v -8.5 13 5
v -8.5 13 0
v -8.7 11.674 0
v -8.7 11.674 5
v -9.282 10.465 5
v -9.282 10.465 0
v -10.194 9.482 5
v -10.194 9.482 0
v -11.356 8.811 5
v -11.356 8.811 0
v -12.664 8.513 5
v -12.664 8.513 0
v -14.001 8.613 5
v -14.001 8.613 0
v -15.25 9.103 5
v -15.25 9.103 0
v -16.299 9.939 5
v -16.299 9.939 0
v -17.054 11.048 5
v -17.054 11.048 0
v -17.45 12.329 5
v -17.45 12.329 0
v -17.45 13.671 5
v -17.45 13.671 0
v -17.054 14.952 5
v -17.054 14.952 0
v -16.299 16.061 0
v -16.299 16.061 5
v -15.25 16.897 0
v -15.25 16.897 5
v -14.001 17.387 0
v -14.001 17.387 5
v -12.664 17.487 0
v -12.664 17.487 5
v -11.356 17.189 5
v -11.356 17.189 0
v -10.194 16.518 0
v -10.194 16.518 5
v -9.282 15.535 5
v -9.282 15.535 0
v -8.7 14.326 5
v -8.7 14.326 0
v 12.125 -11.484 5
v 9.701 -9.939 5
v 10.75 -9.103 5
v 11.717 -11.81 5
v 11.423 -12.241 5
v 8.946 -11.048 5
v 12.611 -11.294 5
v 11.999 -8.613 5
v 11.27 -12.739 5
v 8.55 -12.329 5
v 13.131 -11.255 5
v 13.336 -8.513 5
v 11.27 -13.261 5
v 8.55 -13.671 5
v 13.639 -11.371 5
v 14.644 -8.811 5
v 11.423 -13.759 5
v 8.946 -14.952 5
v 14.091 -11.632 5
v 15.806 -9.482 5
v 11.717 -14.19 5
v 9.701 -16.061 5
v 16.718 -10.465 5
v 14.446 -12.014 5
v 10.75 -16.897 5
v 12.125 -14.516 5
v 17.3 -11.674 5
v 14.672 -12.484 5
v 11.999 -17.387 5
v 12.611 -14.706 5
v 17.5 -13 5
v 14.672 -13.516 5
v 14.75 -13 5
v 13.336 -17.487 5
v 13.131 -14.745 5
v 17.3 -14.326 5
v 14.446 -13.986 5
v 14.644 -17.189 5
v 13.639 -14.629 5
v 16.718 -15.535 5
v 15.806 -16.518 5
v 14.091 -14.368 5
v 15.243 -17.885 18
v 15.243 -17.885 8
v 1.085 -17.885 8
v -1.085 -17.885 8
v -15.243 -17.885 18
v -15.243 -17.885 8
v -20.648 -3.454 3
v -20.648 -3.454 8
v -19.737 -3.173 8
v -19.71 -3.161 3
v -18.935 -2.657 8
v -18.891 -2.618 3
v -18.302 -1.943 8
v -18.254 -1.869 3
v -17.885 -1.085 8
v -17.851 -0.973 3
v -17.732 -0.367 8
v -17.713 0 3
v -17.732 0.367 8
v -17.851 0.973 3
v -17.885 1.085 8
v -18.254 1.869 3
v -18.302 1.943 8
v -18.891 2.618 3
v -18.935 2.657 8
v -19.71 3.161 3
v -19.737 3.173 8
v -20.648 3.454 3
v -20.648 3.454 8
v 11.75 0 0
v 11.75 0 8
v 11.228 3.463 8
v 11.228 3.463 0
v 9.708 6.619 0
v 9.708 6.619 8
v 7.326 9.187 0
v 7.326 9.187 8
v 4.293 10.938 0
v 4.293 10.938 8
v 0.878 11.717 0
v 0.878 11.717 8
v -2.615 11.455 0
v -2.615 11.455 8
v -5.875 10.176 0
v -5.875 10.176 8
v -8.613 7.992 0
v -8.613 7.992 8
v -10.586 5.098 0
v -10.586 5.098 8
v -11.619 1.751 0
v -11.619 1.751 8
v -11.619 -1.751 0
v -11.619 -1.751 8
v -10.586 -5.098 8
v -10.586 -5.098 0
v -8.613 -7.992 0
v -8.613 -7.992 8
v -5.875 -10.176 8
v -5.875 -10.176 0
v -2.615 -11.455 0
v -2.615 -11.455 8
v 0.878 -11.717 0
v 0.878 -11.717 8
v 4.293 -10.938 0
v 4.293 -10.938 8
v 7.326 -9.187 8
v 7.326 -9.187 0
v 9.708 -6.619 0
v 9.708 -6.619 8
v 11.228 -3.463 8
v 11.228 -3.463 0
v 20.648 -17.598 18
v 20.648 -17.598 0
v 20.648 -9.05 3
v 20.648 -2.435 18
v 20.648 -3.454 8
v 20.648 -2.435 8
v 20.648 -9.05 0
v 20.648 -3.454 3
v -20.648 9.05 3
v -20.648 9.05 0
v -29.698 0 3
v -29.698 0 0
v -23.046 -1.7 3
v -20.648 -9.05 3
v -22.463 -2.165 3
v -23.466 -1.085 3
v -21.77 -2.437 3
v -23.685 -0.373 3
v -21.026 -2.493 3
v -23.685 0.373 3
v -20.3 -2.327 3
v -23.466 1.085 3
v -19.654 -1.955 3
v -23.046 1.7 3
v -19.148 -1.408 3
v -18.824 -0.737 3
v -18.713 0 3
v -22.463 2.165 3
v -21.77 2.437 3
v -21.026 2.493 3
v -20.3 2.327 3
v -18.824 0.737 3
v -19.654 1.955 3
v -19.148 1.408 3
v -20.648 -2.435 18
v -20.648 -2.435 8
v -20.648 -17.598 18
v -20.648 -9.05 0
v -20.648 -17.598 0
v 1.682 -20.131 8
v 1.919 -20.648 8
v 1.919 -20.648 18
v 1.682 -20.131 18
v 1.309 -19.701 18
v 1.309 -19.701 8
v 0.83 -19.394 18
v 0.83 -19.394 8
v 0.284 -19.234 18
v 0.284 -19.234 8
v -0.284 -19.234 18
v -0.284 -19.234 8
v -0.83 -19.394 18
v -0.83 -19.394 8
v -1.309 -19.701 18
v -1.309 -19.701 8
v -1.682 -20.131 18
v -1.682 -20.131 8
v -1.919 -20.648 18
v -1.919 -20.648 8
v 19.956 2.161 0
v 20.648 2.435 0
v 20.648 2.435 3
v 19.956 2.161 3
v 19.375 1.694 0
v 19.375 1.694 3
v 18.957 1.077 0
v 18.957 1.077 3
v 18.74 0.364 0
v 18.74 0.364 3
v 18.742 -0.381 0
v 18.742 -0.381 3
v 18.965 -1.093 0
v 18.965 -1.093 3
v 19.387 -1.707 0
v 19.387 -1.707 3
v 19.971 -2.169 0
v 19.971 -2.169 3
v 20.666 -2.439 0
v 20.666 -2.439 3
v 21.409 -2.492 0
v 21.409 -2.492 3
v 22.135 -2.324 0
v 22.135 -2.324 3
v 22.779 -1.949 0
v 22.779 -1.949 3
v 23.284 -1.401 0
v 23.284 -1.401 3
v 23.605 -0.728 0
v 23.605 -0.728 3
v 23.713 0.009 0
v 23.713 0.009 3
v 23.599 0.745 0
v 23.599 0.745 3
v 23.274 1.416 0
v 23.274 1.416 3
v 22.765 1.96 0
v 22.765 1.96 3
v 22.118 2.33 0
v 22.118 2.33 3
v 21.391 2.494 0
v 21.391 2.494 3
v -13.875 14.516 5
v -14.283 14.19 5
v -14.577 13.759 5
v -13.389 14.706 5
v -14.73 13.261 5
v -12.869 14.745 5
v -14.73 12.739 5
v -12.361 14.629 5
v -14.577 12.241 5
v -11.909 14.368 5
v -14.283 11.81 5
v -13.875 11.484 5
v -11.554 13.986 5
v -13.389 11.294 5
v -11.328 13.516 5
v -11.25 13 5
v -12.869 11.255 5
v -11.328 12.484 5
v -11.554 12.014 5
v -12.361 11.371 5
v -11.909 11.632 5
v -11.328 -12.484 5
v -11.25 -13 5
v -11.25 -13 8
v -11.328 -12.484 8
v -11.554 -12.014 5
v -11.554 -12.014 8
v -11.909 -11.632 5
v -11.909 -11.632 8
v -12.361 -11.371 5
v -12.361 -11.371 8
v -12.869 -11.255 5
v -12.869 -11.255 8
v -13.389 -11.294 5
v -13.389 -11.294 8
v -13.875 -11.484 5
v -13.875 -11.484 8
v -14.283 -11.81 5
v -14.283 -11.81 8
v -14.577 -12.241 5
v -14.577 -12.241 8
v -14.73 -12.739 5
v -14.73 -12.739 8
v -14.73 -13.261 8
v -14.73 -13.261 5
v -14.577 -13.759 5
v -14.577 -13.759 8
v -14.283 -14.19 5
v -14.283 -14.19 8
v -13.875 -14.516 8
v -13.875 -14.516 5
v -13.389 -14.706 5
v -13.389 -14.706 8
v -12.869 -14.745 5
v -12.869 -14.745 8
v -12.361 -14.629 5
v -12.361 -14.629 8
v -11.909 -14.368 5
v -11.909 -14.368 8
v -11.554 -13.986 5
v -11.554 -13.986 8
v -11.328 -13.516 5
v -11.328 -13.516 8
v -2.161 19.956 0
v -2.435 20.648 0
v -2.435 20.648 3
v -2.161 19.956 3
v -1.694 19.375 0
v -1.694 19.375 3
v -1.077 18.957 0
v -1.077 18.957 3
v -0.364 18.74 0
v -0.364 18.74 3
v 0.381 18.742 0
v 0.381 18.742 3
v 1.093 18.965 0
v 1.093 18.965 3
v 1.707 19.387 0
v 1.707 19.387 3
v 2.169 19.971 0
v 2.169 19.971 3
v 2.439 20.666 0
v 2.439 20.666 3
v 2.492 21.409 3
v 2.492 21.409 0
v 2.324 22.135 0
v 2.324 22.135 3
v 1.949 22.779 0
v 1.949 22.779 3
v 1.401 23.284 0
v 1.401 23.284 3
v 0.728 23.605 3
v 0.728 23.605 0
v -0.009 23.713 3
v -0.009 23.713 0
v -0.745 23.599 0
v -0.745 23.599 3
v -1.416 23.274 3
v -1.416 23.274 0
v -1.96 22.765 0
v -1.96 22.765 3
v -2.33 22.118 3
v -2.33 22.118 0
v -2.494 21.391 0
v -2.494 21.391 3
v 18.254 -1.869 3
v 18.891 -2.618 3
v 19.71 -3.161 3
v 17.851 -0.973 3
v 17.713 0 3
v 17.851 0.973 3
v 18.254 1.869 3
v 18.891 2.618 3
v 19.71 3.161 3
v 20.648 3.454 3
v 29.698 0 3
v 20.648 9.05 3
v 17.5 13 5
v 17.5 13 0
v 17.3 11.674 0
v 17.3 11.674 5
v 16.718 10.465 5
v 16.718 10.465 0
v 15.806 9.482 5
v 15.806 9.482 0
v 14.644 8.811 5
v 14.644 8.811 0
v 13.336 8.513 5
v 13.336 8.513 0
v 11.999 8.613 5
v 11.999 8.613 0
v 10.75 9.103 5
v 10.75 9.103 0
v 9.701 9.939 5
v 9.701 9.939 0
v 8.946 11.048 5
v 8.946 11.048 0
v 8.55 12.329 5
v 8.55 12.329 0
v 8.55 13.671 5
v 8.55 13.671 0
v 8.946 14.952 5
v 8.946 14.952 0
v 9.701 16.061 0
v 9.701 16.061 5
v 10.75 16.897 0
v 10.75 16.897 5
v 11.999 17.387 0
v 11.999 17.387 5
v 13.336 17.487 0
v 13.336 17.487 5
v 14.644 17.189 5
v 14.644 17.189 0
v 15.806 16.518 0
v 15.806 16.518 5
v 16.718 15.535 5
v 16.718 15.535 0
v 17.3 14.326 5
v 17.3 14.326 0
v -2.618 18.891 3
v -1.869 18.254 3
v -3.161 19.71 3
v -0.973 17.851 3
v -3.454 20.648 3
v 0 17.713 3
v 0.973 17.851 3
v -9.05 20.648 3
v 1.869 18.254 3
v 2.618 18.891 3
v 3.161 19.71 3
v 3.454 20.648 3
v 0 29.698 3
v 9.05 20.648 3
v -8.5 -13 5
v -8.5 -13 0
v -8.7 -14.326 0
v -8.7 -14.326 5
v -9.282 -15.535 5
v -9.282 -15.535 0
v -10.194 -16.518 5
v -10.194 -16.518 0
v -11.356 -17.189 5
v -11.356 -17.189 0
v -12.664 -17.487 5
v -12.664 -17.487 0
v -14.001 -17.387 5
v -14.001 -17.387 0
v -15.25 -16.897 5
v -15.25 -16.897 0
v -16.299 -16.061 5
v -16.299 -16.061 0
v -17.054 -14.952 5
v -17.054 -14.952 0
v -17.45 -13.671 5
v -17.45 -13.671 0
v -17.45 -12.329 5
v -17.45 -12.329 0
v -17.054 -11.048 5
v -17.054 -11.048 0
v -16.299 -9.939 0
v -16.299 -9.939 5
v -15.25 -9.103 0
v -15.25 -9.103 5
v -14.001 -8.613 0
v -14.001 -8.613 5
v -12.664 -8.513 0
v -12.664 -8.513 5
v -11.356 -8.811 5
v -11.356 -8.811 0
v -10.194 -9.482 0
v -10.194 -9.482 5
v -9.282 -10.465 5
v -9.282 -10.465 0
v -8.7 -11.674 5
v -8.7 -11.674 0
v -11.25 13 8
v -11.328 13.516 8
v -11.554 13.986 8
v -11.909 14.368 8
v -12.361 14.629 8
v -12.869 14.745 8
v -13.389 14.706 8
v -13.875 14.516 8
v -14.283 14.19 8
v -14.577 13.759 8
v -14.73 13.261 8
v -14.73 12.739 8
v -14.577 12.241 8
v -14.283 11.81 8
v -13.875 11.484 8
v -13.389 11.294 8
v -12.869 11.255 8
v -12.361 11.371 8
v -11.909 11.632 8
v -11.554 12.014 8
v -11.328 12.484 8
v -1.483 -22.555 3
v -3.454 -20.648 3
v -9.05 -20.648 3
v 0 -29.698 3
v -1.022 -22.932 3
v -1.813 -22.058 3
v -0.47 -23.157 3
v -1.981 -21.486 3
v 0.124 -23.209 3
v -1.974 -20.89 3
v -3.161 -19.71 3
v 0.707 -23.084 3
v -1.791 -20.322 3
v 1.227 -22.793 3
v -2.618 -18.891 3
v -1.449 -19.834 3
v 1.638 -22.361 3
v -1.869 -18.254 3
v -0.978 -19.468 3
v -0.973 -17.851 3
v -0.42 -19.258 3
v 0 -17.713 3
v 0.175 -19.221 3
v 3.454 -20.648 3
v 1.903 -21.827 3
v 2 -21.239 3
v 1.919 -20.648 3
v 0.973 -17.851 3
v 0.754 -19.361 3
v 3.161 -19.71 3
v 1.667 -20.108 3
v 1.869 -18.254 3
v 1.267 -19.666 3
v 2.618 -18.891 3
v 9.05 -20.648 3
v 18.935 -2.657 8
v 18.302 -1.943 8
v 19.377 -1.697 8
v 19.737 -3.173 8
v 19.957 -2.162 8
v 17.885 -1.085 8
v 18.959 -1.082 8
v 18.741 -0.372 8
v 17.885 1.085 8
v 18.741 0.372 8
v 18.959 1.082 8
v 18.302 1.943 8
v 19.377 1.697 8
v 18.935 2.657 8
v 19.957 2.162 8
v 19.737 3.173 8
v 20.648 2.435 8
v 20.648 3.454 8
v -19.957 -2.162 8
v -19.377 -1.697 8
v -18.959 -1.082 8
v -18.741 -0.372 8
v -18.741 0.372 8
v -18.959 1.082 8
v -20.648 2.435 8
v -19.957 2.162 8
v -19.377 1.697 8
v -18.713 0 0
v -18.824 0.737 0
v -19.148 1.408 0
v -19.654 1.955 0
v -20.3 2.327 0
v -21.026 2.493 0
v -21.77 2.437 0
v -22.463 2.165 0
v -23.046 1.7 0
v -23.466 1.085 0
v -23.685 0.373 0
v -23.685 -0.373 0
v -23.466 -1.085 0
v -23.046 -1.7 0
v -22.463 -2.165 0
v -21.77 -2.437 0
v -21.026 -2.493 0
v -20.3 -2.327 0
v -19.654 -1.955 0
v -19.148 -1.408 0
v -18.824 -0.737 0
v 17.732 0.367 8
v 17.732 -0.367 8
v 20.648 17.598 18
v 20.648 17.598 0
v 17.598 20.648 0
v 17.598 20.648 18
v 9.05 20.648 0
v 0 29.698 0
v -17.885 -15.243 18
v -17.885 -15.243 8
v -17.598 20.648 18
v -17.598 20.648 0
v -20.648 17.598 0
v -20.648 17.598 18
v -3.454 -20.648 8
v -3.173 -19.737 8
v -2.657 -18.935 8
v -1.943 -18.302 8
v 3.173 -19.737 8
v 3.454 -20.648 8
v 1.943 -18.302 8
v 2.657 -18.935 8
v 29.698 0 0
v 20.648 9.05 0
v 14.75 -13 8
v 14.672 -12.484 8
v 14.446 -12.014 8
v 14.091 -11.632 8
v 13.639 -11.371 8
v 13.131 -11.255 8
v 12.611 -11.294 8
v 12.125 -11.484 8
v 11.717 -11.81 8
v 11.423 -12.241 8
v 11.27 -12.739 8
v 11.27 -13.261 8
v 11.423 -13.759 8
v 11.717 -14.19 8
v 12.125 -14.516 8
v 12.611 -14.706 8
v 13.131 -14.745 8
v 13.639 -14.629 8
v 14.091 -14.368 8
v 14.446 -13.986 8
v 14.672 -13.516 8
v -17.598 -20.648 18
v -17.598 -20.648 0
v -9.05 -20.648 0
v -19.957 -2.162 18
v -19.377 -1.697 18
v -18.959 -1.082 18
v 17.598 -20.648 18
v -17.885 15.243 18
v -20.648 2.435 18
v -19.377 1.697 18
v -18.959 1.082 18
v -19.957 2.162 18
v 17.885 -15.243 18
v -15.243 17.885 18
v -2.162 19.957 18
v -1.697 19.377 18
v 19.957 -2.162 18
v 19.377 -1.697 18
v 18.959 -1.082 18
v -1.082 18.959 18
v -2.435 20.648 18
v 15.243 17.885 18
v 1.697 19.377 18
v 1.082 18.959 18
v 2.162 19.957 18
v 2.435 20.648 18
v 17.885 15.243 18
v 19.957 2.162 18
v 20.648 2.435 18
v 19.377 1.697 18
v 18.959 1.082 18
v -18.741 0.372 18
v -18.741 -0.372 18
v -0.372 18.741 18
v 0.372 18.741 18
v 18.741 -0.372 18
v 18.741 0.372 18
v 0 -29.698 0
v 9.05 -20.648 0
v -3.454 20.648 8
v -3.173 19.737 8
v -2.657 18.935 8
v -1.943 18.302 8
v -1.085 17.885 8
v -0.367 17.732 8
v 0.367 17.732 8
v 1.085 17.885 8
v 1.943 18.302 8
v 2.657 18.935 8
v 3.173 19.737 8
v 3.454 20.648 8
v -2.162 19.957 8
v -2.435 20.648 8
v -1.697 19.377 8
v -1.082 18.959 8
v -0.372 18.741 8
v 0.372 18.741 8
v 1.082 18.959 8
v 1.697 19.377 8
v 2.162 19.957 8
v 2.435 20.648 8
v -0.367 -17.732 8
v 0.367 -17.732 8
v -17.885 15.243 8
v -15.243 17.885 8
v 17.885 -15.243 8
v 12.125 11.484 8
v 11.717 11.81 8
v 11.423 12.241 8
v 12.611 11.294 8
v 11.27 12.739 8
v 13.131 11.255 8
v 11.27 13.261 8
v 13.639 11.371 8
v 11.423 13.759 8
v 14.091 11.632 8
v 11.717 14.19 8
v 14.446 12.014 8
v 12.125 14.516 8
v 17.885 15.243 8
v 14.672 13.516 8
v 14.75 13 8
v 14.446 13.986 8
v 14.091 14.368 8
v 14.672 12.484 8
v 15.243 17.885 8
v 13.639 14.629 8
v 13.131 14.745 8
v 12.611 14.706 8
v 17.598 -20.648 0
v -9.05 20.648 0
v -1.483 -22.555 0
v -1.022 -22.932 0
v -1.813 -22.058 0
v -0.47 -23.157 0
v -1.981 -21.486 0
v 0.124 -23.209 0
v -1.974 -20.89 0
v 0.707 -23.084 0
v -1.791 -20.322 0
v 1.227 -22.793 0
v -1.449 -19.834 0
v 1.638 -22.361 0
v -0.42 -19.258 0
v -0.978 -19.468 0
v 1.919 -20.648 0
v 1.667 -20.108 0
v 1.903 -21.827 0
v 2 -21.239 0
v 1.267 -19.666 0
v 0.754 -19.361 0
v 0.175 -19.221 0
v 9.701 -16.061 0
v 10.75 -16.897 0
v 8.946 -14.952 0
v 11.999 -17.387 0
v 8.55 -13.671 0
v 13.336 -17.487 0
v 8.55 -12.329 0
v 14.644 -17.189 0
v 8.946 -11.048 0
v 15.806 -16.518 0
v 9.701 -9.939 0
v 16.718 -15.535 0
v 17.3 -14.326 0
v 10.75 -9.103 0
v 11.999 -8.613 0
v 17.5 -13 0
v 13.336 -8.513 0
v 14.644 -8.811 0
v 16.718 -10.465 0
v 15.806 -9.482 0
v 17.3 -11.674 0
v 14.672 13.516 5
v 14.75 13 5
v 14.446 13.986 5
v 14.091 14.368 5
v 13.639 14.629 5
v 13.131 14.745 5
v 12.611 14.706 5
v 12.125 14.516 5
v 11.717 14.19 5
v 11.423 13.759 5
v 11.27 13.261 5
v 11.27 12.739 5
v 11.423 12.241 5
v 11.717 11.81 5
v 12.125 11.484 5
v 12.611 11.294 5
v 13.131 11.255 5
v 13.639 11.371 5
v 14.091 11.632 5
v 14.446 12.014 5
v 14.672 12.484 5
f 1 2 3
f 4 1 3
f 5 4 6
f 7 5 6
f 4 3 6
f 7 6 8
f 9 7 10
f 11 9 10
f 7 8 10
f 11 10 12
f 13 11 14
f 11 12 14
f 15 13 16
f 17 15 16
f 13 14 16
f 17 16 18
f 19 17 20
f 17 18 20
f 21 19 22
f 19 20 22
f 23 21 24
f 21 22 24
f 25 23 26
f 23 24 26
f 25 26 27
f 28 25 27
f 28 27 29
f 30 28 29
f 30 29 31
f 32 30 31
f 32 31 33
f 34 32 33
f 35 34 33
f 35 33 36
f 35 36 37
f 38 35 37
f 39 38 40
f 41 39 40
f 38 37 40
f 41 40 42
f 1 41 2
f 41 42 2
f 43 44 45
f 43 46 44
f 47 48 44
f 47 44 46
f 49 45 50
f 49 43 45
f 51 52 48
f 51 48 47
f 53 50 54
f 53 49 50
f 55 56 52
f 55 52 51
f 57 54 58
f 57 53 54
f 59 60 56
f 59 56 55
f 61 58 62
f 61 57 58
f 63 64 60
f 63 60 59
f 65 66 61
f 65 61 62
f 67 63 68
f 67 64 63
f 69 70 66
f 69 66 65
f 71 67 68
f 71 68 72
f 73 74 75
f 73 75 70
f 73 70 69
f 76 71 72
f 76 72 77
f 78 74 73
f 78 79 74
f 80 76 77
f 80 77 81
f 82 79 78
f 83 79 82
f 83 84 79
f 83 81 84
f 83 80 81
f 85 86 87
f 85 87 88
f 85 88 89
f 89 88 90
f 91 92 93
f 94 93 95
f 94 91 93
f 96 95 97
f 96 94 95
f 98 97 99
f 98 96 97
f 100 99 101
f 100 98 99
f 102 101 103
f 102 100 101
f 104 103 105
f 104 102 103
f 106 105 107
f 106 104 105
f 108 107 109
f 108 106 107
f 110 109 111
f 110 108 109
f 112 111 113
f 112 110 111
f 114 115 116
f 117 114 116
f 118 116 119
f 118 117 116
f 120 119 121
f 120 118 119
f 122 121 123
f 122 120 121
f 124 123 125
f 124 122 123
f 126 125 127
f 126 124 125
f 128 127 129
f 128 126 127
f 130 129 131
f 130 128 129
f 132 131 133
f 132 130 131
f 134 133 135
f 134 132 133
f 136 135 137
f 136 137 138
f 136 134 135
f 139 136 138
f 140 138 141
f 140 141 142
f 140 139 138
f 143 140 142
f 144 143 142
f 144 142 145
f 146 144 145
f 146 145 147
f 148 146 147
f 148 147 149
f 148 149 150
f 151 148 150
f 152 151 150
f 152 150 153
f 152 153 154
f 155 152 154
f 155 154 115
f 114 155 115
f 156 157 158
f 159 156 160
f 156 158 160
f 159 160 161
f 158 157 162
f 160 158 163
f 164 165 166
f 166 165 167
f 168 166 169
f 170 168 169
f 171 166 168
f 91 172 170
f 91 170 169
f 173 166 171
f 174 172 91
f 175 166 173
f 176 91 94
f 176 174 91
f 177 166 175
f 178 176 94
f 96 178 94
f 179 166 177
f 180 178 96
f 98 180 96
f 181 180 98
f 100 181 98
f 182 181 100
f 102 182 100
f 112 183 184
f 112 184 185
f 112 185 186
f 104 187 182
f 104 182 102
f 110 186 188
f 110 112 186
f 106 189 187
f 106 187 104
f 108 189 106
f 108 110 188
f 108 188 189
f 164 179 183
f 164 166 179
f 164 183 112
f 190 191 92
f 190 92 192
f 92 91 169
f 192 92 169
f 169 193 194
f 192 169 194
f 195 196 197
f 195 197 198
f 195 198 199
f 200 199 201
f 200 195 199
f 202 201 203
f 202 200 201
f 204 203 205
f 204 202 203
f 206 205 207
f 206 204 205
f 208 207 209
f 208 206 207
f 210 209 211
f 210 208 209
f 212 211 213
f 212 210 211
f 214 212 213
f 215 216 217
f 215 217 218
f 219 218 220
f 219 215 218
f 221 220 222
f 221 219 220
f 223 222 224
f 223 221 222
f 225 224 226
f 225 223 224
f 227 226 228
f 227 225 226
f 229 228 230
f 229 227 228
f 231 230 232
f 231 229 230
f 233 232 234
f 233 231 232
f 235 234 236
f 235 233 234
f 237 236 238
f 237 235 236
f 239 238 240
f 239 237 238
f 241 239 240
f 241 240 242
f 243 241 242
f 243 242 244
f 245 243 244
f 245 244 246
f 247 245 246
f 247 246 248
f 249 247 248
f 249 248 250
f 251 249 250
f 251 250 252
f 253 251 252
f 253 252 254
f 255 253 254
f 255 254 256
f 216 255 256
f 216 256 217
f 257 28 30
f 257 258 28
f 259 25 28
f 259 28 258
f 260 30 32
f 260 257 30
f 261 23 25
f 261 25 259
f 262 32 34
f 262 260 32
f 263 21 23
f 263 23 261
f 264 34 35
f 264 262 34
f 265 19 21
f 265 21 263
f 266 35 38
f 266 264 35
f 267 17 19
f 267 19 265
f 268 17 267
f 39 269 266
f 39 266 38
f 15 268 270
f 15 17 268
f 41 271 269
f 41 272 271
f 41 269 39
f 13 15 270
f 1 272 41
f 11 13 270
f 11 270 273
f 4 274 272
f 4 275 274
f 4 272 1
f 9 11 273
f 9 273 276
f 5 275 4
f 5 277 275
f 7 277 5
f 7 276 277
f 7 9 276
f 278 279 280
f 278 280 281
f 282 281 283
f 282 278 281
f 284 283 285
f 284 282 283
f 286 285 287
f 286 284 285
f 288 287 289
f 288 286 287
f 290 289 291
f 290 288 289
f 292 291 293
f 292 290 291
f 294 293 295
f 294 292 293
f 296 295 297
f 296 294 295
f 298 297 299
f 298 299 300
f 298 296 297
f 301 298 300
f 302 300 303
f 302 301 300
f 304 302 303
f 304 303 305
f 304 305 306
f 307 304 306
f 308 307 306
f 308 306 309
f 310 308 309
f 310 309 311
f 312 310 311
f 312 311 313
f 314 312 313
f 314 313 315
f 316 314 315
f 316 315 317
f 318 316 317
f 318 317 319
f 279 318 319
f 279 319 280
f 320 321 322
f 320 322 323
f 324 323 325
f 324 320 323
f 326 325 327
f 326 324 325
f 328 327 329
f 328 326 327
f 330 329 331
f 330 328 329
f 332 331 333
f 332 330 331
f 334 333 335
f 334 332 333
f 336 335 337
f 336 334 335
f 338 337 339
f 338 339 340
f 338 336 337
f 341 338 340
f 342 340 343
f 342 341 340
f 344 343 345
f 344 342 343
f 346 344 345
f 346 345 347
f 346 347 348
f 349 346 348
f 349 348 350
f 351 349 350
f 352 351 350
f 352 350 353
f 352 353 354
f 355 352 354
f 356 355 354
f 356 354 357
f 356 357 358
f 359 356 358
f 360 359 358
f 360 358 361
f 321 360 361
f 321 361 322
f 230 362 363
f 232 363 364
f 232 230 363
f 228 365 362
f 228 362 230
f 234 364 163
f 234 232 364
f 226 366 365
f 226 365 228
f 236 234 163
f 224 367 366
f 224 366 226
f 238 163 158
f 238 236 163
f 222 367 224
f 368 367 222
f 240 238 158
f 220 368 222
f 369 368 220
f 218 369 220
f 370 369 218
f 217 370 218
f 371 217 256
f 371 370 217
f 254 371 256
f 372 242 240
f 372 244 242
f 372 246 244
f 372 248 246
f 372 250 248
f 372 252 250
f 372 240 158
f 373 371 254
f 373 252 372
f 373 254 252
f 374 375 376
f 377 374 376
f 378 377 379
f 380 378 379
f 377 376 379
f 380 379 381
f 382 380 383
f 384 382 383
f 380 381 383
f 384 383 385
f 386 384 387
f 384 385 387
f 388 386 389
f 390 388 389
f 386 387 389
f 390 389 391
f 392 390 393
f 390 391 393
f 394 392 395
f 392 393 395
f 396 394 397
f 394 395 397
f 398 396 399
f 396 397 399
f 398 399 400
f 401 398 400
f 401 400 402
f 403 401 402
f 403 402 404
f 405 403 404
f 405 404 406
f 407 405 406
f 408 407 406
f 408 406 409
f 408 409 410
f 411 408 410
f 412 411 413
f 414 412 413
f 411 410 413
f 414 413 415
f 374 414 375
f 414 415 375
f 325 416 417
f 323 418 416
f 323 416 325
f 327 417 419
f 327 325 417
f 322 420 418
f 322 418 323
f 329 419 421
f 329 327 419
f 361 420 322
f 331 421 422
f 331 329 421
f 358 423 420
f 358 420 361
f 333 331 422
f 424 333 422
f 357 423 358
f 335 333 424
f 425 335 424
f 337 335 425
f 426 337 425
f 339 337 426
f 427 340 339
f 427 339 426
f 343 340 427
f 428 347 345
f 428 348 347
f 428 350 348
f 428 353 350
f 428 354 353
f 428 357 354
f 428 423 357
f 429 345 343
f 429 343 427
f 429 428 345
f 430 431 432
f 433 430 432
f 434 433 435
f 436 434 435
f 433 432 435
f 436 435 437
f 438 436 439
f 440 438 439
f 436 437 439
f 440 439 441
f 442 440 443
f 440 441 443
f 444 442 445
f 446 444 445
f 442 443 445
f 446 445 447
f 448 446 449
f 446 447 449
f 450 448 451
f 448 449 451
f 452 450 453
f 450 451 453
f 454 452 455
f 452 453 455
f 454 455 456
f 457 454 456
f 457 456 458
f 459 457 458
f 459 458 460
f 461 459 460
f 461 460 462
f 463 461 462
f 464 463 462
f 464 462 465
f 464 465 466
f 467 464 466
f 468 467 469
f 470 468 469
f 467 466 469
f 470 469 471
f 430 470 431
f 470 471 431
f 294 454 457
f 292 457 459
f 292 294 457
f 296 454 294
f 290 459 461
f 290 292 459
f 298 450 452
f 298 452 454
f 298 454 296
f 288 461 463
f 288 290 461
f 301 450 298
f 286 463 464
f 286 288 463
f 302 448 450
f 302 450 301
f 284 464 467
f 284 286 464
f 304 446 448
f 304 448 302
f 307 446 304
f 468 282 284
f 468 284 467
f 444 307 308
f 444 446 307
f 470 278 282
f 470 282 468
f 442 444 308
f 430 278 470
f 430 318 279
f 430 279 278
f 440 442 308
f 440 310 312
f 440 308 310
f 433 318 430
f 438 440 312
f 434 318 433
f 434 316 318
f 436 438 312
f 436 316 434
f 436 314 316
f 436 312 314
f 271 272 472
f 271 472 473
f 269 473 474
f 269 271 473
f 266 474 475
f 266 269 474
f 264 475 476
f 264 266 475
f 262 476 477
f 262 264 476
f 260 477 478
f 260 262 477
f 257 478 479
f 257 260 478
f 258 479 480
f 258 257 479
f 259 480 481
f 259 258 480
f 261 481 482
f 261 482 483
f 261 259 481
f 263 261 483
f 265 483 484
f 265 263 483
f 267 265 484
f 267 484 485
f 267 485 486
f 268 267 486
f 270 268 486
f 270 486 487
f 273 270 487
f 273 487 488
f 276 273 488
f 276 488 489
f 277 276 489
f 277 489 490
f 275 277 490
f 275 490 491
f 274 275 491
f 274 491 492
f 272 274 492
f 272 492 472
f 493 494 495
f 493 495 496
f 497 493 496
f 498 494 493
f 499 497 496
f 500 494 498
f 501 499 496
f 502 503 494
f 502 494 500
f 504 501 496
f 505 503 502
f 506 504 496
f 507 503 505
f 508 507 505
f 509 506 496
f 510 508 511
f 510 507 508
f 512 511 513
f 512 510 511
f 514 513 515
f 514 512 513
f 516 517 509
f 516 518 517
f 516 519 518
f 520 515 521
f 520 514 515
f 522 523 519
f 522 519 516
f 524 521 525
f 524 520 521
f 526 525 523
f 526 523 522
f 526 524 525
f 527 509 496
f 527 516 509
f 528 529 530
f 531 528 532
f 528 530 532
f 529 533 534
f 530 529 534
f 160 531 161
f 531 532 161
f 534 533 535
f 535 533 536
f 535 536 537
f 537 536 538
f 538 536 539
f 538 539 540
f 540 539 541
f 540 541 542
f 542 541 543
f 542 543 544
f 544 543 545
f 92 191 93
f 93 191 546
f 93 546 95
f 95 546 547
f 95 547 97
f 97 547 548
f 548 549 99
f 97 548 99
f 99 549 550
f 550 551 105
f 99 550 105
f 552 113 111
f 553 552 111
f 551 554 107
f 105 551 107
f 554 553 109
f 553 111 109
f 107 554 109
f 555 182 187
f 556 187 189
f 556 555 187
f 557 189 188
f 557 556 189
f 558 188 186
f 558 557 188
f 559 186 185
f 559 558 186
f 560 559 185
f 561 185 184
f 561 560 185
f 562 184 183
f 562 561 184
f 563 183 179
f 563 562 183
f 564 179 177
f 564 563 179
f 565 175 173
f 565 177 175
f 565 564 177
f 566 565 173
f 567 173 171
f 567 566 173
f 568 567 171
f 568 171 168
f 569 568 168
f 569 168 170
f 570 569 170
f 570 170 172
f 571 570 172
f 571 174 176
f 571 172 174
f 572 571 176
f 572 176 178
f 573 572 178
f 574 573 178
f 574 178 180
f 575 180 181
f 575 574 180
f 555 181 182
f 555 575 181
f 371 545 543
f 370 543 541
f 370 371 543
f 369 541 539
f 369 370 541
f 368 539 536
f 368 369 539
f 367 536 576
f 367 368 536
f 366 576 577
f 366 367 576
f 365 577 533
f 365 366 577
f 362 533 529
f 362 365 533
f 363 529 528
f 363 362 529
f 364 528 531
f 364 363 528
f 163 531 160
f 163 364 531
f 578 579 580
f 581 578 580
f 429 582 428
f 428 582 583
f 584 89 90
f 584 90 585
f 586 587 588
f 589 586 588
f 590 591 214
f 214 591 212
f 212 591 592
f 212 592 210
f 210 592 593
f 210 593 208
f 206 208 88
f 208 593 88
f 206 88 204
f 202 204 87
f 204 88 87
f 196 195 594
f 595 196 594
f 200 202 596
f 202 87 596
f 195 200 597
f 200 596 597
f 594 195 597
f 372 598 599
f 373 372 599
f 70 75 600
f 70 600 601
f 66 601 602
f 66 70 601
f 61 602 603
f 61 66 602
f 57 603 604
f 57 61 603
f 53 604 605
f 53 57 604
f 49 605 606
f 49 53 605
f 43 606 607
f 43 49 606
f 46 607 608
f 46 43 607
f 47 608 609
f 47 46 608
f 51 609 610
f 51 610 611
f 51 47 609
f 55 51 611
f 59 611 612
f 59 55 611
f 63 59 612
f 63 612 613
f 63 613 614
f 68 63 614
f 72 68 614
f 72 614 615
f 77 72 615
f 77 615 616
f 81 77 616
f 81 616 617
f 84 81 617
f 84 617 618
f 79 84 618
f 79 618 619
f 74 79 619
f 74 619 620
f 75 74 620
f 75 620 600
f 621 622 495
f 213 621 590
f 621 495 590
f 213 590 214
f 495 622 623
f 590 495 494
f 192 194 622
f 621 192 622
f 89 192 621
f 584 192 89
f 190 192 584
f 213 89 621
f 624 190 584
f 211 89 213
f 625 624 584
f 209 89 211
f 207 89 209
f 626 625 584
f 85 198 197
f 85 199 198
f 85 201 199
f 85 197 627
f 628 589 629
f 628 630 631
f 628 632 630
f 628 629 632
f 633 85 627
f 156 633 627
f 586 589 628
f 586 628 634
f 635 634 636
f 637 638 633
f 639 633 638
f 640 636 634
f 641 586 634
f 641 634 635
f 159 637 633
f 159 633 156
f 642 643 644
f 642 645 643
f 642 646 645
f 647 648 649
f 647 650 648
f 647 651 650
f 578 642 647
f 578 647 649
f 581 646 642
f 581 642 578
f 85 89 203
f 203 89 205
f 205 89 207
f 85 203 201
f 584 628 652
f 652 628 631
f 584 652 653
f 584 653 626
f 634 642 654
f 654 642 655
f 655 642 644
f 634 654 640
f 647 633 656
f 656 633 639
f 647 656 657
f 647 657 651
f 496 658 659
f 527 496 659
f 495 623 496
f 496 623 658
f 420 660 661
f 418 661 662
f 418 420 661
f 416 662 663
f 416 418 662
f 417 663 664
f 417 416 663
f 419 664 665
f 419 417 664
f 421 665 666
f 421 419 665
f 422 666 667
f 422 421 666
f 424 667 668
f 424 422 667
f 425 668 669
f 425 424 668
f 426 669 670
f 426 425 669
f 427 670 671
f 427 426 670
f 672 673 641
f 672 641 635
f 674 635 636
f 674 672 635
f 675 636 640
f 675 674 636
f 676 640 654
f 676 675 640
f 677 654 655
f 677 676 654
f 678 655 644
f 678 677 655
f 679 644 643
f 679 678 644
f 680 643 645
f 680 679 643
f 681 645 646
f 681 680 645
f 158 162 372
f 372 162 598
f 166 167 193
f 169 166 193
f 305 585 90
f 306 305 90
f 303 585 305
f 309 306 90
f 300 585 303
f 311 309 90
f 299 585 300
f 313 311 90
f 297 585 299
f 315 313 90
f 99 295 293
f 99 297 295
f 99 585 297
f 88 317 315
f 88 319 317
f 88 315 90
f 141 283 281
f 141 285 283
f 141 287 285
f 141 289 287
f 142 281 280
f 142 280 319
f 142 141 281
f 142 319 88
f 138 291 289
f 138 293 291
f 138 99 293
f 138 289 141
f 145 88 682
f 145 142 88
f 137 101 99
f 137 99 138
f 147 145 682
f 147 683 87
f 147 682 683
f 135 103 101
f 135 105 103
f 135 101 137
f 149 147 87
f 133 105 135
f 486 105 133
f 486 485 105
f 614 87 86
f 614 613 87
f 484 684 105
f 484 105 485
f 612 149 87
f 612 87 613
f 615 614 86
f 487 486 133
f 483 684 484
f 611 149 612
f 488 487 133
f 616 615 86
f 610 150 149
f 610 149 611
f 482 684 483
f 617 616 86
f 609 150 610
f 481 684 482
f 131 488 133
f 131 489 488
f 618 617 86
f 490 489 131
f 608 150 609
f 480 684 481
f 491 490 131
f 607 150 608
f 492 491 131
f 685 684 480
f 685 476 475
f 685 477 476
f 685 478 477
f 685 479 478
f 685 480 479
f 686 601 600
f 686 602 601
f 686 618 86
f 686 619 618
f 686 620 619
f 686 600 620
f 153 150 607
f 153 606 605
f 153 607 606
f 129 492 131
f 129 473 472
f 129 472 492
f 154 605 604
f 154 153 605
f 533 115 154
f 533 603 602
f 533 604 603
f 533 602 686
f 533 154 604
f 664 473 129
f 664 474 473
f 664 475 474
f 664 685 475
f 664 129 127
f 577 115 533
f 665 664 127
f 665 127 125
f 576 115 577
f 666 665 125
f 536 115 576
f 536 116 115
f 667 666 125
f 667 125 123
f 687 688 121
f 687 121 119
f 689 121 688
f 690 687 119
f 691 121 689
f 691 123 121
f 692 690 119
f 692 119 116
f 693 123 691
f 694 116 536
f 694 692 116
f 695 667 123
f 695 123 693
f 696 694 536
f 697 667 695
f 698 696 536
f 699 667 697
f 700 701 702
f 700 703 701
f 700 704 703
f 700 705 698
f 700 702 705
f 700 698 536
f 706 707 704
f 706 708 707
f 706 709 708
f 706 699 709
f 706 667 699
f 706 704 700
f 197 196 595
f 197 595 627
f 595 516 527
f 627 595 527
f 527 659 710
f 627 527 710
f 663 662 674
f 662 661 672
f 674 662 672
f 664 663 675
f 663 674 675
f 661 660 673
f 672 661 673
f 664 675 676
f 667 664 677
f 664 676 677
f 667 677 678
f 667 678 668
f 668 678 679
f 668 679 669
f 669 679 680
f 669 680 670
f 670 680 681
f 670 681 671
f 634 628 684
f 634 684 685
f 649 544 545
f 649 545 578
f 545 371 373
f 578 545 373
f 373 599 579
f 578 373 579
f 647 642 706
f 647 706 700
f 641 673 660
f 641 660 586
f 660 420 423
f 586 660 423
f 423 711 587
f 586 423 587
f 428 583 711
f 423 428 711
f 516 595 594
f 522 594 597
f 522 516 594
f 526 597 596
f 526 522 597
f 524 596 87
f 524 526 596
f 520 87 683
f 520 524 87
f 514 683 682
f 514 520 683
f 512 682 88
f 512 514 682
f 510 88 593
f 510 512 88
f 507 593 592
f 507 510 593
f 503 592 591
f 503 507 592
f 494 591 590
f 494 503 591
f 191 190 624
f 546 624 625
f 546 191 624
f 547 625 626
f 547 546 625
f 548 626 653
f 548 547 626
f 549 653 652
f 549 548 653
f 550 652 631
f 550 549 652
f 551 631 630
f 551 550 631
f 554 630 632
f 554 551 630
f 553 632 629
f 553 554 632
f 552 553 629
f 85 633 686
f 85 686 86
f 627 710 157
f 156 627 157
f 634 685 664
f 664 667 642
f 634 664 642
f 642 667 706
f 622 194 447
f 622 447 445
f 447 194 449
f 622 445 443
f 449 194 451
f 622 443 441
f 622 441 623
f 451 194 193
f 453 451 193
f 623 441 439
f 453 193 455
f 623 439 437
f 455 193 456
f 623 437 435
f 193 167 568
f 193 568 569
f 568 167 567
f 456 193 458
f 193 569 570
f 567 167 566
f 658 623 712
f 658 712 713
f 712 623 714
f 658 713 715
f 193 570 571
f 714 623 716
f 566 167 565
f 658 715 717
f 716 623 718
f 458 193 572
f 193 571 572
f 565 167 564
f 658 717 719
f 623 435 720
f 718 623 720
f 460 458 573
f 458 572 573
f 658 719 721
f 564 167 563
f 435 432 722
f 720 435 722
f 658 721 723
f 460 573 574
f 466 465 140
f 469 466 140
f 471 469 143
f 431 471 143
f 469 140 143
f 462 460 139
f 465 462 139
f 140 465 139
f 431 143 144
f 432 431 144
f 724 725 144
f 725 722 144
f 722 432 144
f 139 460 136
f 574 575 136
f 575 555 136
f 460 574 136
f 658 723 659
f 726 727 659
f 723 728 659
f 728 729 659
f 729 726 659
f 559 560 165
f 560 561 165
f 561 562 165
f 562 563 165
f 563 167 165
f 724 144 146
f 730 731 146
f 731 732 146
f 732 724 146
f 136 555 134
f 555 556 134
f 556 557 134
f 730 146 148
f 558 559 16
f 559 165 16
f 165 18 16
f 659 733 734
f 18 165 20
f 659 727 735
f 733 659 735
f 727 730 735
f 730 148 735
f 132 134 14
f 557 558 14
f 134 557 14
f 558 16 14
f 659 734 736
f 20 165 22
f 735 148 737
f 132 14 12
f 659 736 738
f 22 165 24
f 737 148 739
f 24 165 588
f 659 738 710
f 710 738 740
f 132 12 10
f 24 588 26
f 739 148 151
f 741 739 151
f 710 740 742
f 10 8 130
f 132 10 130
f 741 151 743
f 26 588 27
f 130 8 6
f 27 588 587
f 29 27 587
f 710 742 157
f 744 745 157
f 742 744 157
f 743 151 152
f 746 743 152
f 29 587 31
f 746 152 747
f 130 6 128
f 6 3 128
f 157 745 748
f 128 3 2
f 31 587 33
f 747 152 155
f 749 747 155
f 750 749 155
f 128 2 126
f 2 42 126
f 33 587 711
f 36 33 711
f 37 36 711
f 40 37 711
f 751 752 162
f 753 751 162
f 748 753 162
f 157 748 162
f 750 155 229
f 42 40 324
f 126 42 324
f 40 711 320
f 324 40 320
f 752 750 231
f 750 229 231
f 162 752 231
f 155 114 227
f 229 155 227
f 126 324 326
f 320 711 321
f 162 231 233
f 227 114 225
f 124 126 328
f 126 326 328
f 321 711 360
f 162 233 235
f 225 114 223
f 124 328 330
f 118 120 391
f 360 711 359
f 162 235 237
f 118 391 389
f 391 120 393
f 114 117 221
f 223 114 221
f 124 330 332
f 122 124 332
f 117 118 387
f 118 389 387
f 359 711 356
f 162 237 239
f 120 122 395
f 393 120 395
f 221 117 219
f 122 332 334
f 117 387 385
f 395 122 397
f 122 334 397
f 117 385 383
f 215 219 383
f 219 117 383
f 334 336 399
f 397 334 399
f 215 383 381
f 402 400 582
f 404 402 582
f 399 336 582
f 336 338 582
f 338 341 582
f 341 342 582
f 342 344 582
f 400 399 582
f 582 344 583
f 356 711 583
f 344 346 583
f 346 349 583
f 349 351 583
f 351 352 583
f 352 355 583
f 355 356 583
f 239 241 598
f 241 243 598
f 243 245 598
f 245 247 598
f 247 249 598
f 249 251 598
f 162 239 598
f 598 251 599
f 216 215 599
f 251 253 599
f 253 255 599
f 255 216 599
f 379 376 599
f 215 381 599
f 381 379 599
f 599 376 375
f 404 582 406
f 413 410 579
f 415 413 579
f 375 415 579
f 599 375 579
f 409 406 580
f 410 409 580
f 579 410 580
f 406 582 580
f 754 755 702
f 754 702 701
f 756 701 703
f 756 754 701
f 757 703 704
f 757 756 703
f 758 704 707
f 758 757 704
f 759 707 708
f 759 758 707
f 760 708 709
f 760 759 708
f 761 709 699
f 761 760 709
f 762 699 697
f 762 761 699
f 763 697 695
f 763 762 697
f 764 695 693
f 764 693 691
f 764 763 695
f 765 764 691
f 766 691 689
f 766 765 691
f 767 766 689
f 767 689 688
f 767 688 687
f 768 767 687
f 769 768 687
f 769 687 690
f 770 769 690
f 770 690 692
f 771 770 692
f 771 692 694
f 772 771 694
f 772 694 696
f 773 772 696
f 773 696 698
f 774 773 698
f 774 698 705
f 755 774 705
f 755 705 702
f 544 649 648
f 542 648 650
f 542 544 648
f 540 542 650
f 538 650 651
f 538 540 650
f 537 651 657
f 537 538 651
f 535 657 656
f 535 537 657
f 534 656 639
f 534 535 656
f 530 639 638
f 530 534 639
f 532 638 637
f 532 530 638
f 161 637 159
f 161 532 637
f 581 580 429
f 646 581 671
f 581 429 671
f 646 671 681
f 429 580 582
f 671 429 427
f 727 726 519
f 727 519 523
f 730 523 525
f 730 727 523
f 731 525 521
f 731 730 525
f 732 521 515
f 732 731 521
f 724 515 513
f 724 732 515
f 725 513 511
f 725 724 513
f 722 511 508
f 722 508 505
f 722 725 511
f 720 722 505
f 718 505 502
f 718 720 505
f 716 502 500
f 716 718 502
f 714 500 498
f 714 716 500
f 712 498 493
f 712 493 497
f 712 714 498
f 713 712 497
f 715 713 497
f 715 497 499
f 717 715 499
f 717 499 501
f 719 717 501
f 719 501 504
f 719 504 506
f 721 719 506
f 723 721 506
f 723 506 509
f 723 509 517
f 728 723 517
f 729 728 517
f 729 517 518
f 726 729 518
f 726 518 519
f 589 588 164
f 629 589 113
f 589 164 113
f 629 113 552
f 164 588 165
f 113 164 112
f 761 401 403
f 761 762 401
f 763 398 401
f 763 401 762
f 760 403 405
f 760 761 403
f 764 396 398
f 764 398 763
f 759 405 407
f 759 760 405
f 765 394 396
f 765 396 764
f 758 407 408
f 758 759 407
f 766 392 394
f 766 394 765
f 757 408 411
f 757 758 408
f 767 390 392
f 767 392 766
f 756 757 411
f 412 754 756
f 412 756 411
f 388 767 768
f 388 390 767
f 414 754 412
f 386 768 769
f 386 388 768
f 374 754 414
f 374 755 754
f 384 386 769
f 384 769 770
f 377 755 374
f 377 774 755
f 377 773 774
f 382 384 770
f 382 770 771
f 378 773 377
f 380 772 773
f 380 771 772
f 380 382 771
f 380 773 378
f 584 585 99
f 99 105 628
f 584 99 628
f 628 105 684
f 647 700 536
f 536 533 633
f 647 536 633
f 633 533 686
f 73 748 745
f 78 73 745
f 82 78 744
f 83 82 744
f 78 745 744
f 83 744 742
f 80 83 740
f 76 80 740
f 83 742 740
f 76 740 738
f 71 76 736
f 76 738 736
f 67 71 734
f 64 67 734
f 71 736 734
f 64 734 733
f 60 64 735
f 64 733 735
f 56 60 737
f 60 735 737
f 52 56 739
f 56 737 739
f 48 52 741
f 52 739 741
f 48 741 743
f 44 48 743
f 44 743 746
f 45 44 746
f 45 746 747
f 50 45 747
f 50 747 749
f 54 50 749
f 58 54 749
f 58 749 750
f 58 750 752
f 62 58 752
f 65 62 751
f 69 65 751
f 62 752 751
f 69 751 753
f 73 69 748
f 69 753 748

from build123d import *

# Parameters (mm, degrees)
F4_DEPTH  = 18
F2_R      = 1.75
F2_R_2    = 11.75
F5_DEPTH  = 8
F3_R      = 2
F3_R_2    = 1.75
F3_R_3    = 2.5
F3_R_4    = 11.75
F6_DEPTH  = 3
F7_DEPTH  = 18
F8_R      = 4.5
F8_R_2    = 1.75
F9_DEPTH  = 5
F10_DEPTH = 5
F11_R     = 3.5
F12_DEPTH = 5
F13_DEPTH = 5
F14_DEPTH = 5


with BuildPart() as f4:
    # F1 (on Top) → F4 (new body)
    with BuildSketch(Plane.XY):
        Polygon((-17.59793, 20.648238), (-20.648238, 17.59793), (-20.648238, -17.59793), (-17.59793, -20.648238), (17.59793, -20.648238), (20.648238, -17.59793), (20.648238, 17.59793), (17.59793, 20.648238), align=None)
        Polygon((-15.243323, -17.885499), (-17.885499, -15.243323), (-17.885499, 15.243323), (-15.243323, 17.885499), (15.243323, 17.885499), (17.885499, 15.243323), (17.885499, -15.243323), (15.243323, -17.885499), align=None, mode=Mode.SUBTRACT)
    extrude(amount=F4_DEPTH)

    # F2 (on Top) → F5 (join)
    with BuildSketch(Plane.XY):
        Polygon((-15.243323, 17.885499), (-17.885499, 15.243323), (-17.885499, -15.243323), (-15.243323, -17.885499), (15.243323, -17.885499), (17.885499, -15.243323), (17.885499, 15.243323), (15.243323, 17.885499), align=None)
        with Locations((-13, -13)):
            Circle(F2_R, mode=Mode.SUBTRACT)
        with Locations((13, -13)):
            Circle(F2_R, mode=Mode.SUBTRACT)
        Circle(F2_R_2, mode=Mode.SUBTRACT)
        with Locations((-13, 13)):
            Circle(F2_R, mode=Mode.SUBTRACT)
        with Locations((13, 13)):
            Circle(F2_R, mode=Mode.SUBTRACT)
    extrude(amount=F5_DEPTH)

    # F3 (on Top) → F6 (join)
    with BuildSketch(Plane.XY):
        Polygon((-29.698485, 0), (0, -29.698485), (29.698485, 0), (0, 29.698485), align=None)
        with Locations((0, -21.213203)):
            Circle(F3_R, mode=Mode.SUBTRACT)
        with Locations((-13, -13)):
            Circle(F3_R_2, mode=Mode.SUBTRACT)
        with Locations((13, -13)):
            Circle(F3_R_2, mode=Mode.SUBTRACT)
        with Locations((-21.213203, 0)):
            Circle(F3_R_3, mode=Mode.SUBTRACT)
        Circle(F3_R_4, mode=Mode.SUBTRACT)
        with Locations((-13, 13)):
            Circle(F3_R_2, mode=Mode.SUBTRACT)
        with Locations((0, 21.213203)):
            Circle(F3_R_3, mode=Mode.SUBTRACT)
        with Locations((13, 13)):
            Circle(F3_R_2, mode=Mode.SUBTRACT)
        with Locations((21.213203, 0)):
            Circle(F3_R_3, mode=Mode.SUBTRACT)
    extrude(amount=F6_DEPTH)

    # F3 (on Top) → F7 (cut)
    with BuildSketch(Plane.XY):
        with Locations((21.213203, 0)):
            Circle(F3_R_3)
        with Locations((0, 21.213203)):
            Circle(F3_R_3)
        with Locations((0, -21.213203)):
            Circle(F3_R)
        with Locations((-21.213203, 0)):
            Circle(F3_R_3)
    extrude(amount=F7_DEPTH, mode=Mode.SUBTRACT)

    # F8 (on face) + F2 (on Top) → F9 (cut)
    with BuildSketch(Plane(origin=(0, 0, 0), x_dir=(1, 0, 0), z_dir=(0, 0, -1))):
        with Locations((-13, -13)):
            Circle(F8_R)
        with Locations((-13, -13)):
            Circle(F8_R_2, mode=Mode.SUBTRACT)
    with BuildSketch(Plane.XY):
        with Locations((-13, 13)):
            Circle(F2_R)
    extrude(amount=-F9_DEPTH, mode=Mode.SUBTRACT)

    # F8 (on face) + F2 (on Top) → F10 (cut)
    with BuildSketch(Plane(origin=(0, 0, 0), x_dir=(1, 0, 0), z_dir=(0, 0, -1))):
        with Locations((13, 13)):
            Circle(F8_R)
        with Locations((13, 13)):
            Circle(F8_R_2, mode=Mode.SUBTRACT)
    with BuildSketch(Plane.XY):
        with Locations((13, -13)):
            Circle(F2_R)
    extrude(amount=-F10_DEPTH, mode=Mode.SUBTRACT)

    # F11 (on face) → F12 (cut)
    with BuildSketch(Plane.XY.offset(3)):
        with Locations((0, 21.213203)):
            Circle(F11_R)
        with Locations((0, -21.213203)):
            Circle(F11_R)
        with Locations((21.213203, 0)):
            Circle(F11_R)
        with Locations((-21.213203, 0)):
            Circle(F11_R)
    extrude(amount=F12_DEPTH, mode=Mode.SUBTRACT)

    # F8 (on face) → F13 (cut)
    with BuildSketch(Plane(origin=(0, 0, 0), x_dir=(1, 0, 0), z_dir=(0, 0, -1))):
        with Locations((13, -13)):
            Circle(F8_R)
        with Locations((13, -13)):
            Circle(F8_R_2, mode=Mode.SUBTRACT)
    extrude(amount=-F13_DEPTH, mode=Mode.SUBTRACT)

    # F8 (on face) → F14 (cut)
    with BuildSketch(Plane(origin=(0, 0, 0), x_dir=(1, 0, 0), z_dir=(0, 0, -1))):
        with Locations((-13, 13)):
            Circle(F8_R)
        with Locations((-13, 13)):
            Circle(F8_R_2, mode=Mode.SUBTRACT)
    extrude(amount=-F14_DEPTH, mode=Mode.SUBTRACT)


solid = f4.part
